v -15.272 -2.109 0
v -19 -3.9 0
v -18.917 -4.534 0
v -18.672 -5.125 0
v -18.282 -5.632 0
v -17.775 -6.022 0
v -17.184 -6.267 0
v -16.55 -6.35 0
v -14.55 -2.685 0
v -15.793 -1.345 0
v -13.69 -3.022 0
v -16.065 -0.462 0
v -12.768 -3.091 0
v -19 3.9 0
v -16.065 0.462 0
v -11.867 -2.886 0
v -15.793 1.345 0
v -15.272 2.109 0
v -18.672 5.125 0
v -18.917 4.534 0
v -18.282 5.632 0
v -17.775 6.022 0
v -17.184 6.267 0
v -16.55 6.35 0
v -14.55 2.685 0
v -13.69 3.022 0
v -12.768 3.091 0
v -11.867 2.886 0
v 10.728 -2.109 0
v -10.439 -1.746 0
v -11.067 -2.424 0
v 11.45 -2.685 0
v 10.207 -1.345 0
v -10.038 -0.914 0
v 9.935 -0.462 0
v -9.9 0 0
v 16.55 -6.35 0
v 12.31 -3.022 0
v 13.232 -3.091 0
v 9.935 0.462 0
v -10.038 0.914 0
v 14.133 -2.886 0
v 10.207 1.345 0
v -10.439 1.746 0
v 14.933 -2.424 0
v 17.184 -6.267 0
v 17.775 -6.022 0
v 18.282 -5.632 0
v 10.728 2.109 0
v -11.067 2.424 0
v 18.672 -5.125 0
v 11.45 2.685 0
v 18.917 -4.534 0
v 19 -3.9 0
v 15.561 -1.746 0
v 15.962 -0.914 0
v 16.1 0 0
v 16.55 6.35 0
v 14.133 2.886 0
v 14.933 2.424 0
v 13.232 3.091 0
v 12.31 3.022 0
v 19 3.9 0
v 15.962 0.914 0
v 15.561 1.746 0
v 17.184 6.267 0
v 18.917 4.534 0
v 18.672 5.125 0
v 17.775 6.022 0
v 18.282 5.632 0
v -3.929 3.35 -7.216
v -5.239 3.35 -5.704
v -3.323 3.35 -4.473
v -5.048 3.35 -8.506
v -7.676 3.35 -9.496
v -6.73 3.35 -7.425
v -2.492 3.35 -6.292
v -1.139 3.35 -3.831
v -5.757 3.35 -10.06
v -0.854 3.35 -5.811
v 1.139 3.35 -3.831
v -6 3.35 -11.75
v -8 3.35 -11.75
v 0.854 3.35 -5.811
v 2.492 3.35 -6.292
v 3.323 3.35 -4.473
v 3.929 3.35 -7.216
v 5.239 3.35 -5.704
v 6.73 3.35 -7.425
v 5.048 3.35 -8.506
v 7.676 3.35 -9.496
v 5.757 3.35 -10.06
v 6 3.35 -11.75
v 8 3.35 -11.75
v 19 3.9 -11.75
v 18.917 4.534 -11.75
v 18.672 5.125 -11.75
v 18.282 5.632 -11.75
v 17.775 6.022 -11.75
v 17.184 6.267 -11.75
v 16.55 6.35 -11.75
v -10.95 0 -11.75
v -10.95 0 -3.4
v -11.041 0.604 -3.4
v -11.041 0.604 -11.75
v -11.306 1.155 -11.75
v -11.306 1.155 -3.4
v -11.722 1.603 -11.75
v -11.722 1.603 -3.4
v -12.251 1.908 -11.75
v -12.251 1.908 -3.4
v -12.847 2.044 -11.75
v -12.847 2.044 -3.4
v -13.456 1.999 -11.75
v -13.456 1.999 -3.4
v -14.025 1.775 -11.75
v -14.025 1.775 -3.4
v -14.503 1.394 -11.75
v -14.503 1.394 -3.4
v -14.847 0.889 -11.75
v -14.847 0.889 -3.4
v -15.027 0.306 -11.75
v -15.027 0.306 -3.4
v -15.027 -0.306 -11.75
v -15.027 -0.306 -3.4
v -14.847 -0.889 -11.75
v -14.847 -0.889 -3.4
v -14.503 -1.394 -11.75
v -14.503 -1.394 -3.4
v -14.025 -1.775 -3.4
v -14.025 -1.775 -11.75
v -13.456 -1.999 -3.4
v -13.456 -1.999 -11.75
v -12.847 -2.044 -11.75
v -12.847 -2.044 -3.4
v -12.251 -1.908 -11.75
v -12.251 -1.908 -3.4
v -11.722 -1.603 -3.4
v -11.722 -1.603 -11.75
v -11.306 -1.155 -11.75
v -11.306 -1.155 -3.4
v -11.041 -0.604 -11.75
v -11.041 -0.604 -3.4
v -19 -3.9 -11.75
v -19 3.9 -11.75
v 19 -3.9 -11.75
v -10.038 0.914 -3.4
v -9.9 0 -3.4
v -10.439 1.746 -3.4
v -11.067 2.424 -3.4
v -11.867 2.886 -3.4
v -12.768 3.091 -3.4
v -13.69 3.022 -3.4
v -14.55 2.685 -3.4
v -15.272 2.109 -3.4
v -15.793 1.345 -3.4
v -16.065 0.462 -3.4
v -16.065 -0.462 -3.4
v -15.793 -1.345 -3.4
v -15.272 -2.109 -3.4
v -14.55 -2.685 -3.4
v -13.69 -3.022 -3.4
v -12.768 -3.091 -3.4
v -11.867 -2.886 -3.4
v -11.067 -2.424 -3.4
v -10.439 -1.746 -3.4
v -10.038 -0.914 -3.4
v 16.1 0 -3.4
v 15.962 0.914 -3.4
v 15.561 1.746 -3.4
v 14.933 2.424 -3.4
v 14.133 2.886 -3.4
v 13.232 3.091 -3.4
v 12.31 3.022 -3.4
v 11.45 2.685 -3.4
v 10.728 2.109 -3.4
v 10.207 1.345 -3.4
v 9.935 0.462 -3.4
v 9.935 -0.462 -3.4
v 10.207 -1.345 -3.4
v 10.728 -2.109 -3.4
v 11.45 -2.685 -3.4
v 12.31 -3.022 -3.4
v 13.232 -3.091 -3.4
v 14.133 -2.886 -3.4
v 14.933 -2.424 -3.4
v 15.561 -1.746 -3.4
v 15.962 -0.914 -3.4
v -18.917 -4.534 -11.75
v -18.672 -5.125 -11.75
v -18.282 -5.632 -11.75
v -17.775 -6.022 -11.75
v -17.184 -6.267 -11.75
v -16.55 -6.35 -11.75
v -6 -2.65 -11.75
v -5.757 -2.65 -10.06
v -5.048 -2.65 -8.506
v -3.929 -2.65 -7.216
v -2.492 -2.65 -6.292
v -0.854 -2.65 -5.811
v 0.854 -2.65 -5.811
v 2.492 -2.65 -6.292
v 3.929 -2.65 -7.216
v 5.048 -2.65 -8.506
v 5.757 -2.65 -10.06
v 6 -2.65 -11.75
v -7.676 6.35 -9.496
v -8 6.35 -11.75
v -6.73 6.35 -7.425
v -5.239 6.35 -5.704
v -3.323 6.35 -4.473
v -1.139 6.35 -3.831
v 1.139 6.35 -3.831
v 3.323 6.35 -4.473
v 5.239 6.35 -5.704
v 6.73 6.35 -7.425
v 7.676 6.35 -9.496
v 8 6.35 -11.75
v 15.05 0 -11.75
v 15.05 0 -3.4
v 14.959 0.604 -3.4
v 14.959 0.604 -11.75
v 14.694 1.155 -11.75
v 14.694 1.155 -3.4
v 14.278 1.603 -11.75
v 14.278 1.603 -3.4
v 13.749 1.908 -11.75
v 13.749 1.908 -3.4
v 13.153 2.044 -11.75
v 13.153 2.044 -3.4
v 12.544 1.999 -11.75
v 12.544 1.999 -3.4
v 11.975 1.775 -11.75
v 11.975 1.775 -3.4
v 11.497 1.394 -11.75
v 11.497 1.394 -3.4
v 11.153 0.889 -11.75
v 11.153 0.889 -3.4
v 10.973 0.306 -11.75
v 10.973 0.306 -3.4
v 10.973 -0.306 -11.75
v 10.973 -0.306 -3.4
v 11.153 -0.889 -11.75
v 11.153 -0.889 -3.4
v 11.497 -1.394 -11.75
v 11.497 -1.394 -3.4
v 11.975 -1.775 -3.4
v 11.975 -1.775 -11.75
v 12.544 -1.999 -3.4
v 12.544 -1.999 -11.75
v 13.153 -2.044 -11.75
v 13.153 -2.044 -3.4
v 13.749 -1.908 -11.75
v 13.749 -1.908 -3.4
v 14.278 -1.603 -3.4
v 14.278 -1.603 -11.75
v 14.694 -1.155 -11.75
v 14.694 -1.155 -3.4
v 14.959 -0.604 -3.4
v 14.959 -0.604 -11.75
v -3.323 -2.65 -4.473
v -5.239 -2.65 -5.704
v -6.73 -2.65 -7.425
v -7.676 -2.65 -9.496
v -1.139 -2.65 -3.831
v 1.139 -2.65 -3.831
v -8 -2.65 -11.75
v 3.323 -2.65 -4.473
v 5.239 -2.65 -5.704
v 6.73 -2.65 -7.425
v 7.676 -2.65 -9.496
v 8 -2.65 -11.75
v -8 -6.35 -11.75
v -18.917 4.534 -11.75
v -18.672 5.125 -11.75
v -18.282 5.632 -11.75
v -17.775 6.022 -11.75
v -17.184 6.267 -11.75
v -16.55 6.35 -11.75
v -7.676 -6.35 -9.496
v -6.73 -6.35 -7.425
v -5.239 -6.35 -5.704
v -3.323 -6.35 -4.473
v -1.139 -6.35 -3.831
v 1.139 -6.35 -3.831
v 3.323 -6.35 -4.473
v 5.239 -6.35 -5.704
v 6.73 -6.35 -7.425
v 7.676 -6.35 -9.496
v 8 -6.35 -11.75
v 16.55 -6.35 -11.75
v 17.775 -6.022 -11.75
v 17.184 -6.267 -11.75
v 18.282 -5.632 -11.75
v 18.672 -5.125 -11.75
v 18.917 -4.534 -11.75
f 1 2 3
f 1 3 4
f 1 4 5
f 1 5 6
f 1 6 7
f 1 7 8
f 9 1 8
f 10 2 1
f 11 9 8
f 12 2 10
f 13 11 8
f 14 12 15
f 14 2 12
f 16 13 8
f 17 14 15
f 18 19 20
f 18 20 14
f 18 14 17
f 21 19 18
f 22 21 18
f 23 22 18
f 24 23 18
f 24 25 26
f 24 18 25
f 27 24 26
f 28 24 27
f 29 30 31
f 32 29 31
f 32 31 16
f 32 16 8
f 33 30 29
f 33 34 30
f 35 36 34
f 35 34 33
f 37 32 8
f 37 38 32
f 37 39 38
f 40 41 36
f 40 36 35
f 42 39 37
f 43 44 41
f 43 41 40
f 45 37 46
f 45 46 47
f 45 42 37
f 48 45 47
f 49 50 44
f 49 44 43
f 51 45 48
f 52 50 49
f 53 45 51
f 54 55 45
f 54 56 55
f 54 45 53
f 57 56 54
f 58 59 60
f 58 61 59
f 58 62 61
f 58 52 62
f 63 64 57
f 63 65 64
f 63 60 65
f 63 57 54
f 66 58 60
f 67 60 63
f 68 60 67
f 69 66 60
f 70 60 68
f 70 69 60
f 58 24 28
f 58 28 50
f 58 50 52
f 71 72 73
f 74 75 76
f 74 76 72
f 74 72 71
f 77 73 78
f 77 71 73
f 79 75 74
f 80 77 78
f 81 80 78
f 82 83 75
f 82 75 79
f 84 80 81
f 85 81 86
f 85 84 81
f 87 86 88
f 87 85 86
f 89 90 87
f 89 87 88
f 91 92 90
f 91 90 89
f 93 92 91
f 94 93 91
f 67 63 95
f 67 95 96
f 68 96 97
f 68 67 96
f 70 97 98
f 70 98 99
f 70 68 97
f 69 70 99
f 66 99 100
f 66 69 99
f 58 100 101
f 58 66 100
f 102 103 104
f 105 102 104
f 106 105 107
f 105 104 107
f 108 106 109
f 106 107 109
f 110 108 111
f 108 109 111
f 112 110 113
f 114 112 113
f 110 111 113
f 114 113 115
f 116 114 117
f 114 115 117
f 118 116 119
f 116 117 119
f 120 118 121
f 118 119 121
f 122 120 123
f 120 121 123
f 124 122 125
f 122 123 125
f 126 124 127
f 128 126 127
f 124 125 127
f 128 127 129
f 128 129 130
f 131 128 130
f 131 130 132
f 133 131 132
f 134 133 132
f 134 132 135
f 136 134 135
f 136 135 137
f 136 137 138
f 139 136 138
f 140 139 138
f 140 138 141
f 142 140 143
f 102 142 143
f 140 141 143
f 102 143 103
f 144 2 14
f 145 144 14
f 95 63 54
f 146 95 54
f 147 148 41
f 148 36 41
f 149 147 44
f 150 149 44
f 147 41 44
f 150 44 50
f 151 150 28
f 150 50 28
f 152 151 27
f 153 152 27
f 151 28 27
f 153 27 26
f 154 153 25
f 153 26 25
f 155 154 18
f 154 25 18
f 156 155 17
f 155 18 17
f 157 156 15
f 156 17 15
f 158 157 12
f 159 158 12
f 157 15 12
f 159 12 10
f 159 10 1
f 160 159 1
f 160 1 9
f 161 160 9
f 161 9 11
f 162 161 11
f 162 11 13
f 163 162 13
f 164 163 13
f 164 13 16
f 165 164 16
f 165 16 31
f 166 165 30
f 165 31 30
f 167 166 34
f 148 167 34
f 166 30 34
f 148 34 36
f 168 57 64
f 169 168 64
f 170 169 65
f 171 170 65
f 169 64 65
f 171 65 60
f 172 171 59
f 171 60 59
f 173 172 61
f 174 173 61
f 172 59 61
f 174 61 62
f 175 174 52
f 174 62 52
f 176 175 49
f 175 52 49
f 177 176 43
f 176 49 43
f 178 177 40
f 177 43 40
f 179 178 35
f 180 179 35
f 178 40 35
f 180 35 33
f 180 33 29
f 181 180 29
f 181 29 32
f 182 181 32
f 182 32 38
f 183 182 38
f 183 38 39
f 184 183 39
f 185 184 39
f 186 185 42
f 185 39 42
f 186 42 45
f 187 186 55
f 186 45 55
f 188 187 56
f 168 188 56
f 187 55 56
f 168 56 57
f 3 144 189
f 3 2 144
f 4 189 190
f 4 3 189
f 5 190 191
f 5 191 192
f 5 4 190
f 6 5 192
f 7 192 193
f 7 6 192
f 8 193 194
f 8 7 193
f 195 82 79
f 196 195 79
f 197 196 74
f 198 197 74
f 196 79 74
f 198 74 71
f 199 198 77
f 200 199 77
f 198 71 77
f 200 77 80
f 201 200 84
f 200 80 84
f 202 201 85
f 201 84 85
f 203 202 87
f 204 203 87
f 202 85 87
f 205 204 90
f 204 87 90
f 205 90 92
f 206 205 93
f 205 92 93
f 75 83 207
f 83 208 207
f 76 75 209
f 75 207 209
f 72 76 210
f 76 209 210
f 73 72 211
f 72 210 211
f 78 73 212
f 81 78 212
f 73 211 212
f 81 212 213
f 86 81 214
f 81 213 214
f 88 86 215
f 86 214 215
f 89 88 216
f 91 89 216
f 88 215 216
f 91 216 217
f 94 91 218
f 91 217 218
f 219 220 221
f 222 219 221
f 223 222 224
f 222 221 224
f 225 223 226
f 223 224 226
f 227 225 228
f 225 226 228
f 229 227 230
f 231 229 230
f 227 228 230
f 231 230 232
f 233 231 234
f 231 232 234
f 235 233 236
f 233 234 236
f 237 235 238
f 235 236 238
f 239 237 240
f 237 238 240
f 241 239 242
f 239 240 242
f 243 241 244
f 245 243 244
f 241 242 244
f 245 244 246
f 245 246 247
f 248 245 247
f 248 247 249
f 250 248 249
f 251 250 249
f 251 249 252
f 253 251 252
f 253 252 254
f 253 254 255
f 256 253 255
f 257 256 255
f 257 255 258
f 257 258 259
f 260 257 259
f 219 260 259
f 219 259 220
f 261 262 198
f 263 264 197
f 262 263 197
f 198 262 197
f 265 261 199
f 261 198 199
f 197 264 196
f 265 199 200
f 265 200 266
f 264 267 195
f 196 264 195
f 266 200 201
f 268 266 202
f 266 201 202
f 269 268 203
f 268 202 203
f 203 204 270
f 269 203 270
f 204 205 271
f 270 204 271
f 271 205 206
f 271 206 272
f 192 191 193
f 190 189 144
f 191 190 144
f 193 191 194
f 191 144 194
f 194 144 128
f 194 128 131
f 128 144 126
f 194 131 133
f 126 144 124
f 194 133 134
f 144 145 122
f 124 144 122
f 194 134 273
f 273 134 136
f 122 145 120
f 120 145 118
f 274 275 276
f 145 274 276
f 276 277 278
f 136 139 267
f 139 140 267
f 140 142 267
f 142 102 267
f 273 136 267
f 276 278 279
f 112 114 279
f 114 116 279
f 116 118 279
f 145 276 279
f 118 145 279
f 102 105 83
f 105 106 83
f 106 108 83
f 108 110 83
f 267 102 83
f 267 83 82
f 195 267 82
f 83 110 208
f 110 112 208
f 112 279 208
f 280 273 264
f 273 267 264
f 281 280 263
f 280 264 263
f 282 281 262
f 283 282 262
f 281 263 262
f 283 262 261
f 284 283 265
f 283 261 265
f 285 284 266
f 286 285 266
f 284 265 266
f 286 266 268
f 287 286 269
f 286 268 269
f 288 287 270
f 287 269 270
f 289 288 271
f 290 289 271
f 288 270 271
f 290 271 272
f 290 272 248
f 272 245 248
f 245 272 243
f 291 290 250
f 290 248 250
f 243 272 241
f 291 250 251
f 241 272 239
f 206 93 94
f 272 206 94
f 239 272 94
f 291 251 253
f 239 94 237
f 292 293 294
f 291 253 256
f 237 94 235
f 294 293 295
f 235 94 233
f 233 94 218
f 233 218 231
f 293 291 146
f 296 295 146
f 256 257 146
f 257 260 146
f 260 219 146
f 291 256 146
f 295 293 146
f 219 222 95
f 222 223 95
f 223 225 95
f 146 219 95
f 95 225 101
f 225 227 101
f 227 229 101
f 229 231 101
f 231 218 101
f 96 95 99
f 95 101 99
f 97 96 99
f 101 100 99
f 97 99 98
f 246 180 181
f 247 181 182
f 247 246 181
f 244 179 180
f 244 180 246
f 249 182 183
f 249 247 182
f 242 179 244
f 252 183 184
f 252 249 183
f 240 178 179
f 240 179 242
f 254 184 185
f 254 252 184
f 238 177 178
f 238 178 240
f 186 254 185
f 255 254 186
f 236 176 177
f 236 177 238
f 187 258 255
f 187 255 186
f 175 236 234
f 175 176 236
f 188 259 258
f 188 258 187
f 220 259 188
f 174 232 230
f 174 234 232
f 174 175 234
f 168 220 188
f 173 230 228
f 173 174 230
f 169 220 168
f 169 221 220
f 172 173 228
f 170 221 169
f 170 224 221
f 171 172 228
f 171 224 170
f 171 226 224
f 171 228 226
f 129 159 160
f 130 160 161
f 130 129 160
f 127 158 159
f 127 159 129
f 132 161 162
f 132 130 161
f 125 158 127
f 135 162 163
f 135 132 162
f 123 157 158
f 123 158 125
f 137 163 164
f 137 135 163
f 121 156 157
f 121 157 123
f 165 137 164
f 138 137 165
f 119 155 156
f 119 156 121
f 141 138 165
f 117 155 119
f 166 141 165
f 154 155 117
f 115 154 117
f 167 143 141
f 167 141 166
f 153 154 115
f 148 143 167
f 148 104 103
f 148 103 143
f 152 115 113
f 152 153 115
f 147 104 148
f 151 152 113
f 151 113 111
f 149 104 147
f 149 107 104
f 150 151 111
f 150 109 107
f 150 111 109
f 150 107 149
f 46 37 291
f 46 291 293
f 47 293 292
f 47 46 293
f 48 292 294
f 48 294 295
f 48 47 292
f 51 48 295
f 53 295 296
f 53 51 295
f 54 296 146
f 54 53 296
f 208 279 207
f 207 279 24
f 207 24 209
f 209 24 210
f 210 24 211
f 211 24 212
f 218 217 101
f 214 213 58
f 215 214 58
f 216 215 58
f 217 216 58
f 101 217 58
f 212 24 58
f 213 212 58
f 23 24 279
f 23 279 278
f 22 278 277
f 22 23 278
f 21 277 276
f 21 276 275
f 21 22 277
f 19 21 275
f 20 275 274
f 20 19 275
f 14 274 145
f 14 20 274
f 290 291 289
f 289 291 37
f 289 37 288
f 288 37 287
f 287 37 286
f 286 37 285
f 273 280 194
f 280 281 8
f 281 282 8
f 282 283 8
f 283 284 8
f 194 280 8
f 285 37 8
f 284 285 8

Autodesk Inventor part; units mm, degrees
ref_plane "YZ Plane" through (0, 0, 0) normal (1, 0, 0) x (0, 1, 0)
ref_plane "XZ Plane" through (0, 0, 0) normal (0, 1, 0) x (-1, 0, 0)
ref_plane "XY Plane" through (0, 0, 0) normal (0, 0, 1) x (1, 0, 0)
sketch "Base Sketch" plane through (0, 0, 0) normal (0, 0, 1) x (1, 0, 0)
  line L0 (-16.55, 6.35) -> (16.55, 6.35)
  line L1 (19, 3.9) -> (19, -3.9)
  line L2 (16.55, -6.35) -> (-16.55, -6.35)
  line L3 (-19, -3.9) -> (-19, 3.9)
  line L4 (0, 9.6004) -> (0, -9.6004) construction
  line L5 (-27.3104, 0) -> (27.3104, 0) construction
  arc A0 (19, 3.9) -> (16.55, 6.35) centre (16.55, 3.9) ccw
  arc A1 (-16.55, 6.35) -> (-19, 3.9) centre (-16.55, 3.9) ccw
  arc A2 (-19, -3.9) -> (-16.55, -6.35) centre (-16.55, -3.9) ccw
  arc A3 (16.55, -6.35) -> (19, -3.9) centre (16.55, -3.9) ccw
  point P0 (0, 0)
  point P1 (19, -6.35)
  point P2 (-19, -6.35)
  point P3 (0, 6.35)
  point P4 (19, 0)
  dimension "d0" = 38
  dimension "d2" = 2.45
  dimension "d3" = 12.7
extrude "Base Extrusion (11.75)" add sketch "Base Sketch" against normal blind 11.75
sketch "Screw Holes Sketch" plane through (0, 0, 0) normal (0, 0, 1) x (1, 0, 0)
  line L0 (0, 8.89) -> (0, -8.89) construction
  line L1 (-26.6, 0) -> (26.6, 0) construction
  circle A0 centre (-13, 0) radius 2.05
  circle A1 centre (-13, 0) radius 3.1
  circle A2 centre (13, 0) radius 2.05
  circle A3 centre (13, 0) radius 3.1
  point P0 (0, 0)
  dimension "d6" = 4.1
  dimension "d7" = 13
  dimension "d8" = 6.2
extrude "Screw Holes Extrusion (To)" cut sketch "Screw Holes Sketch" against normal up to surface (11.75 mm away) contours A0 | A2
extrude "Screw Counterbores Extrusion (3.4)" cut sketch "Screw Holes Sketch" against normal blind 3.4
sketch "Heatsink Arcs Sketch" plane through (-16.55, 6.35, 0) normal (0, 1, 0) x (1, 0, 0)
  arc A0 (10.55, 11.75) -> (22.55, 11.75) centre (16.55, 11.75) ccw
  arc A1 (8.55, 11.75) -> (24.55, 11.75) centre (16.55, 11.75) ccw
  line L0 (8.55, 11.75) -> (10.55, 11.75)
  line L1 (22.55, 11.75) -> (24.55, 11.75)
  line L2 (10.55, 11.75) -> (22.55, 11.75)
  point P0 (16.55, 0)
  dimension "d13" = 6
  dimension "d14" = 8
extrude "Top Outer Arc Extrusion (3)" cut sketch "Heatsink Arcs Sketch" against normal blind 3 contours A0 L1 A1 L0
extrude "Inner Arc Extrusion (Through)" cut sketch "Heatsink Arcs Sketch" against normal up to surface (12.7 mm away) contours L2 A0
ref_plane "Lower Outer Arc Plane (9)" through (-16.55, -2.65, 0) normal (0, 1, 0) x (1, 0, 0)
sketch "Sketch4" plane through (-16.55, -2.65, 0) normal (0, 1, 0) x (1, 0, 0)
  arc A0 (8.55, 11.75) -> (24.55, 11.75) centre (16.55, 11.75) ccw projected
  arc A1 (10.55, 11.75) -> (22.55, 11.75) centre (16.55, 11.75) ccw projected
  line L0 (22.55, 11.75) -> (24.55, 11.75) projected
  line L1 (8.55, 11.75) -> (10.55, 11.75) projected
  point P0 (16.55, 0)
extrude "Bottom Outer Arc Extrusion (3.7)" cut sketch "Sketch4" against normal up to surface (3.7 mm away)
properties part number "e3D_V6_Bowden_Clamp_01"
